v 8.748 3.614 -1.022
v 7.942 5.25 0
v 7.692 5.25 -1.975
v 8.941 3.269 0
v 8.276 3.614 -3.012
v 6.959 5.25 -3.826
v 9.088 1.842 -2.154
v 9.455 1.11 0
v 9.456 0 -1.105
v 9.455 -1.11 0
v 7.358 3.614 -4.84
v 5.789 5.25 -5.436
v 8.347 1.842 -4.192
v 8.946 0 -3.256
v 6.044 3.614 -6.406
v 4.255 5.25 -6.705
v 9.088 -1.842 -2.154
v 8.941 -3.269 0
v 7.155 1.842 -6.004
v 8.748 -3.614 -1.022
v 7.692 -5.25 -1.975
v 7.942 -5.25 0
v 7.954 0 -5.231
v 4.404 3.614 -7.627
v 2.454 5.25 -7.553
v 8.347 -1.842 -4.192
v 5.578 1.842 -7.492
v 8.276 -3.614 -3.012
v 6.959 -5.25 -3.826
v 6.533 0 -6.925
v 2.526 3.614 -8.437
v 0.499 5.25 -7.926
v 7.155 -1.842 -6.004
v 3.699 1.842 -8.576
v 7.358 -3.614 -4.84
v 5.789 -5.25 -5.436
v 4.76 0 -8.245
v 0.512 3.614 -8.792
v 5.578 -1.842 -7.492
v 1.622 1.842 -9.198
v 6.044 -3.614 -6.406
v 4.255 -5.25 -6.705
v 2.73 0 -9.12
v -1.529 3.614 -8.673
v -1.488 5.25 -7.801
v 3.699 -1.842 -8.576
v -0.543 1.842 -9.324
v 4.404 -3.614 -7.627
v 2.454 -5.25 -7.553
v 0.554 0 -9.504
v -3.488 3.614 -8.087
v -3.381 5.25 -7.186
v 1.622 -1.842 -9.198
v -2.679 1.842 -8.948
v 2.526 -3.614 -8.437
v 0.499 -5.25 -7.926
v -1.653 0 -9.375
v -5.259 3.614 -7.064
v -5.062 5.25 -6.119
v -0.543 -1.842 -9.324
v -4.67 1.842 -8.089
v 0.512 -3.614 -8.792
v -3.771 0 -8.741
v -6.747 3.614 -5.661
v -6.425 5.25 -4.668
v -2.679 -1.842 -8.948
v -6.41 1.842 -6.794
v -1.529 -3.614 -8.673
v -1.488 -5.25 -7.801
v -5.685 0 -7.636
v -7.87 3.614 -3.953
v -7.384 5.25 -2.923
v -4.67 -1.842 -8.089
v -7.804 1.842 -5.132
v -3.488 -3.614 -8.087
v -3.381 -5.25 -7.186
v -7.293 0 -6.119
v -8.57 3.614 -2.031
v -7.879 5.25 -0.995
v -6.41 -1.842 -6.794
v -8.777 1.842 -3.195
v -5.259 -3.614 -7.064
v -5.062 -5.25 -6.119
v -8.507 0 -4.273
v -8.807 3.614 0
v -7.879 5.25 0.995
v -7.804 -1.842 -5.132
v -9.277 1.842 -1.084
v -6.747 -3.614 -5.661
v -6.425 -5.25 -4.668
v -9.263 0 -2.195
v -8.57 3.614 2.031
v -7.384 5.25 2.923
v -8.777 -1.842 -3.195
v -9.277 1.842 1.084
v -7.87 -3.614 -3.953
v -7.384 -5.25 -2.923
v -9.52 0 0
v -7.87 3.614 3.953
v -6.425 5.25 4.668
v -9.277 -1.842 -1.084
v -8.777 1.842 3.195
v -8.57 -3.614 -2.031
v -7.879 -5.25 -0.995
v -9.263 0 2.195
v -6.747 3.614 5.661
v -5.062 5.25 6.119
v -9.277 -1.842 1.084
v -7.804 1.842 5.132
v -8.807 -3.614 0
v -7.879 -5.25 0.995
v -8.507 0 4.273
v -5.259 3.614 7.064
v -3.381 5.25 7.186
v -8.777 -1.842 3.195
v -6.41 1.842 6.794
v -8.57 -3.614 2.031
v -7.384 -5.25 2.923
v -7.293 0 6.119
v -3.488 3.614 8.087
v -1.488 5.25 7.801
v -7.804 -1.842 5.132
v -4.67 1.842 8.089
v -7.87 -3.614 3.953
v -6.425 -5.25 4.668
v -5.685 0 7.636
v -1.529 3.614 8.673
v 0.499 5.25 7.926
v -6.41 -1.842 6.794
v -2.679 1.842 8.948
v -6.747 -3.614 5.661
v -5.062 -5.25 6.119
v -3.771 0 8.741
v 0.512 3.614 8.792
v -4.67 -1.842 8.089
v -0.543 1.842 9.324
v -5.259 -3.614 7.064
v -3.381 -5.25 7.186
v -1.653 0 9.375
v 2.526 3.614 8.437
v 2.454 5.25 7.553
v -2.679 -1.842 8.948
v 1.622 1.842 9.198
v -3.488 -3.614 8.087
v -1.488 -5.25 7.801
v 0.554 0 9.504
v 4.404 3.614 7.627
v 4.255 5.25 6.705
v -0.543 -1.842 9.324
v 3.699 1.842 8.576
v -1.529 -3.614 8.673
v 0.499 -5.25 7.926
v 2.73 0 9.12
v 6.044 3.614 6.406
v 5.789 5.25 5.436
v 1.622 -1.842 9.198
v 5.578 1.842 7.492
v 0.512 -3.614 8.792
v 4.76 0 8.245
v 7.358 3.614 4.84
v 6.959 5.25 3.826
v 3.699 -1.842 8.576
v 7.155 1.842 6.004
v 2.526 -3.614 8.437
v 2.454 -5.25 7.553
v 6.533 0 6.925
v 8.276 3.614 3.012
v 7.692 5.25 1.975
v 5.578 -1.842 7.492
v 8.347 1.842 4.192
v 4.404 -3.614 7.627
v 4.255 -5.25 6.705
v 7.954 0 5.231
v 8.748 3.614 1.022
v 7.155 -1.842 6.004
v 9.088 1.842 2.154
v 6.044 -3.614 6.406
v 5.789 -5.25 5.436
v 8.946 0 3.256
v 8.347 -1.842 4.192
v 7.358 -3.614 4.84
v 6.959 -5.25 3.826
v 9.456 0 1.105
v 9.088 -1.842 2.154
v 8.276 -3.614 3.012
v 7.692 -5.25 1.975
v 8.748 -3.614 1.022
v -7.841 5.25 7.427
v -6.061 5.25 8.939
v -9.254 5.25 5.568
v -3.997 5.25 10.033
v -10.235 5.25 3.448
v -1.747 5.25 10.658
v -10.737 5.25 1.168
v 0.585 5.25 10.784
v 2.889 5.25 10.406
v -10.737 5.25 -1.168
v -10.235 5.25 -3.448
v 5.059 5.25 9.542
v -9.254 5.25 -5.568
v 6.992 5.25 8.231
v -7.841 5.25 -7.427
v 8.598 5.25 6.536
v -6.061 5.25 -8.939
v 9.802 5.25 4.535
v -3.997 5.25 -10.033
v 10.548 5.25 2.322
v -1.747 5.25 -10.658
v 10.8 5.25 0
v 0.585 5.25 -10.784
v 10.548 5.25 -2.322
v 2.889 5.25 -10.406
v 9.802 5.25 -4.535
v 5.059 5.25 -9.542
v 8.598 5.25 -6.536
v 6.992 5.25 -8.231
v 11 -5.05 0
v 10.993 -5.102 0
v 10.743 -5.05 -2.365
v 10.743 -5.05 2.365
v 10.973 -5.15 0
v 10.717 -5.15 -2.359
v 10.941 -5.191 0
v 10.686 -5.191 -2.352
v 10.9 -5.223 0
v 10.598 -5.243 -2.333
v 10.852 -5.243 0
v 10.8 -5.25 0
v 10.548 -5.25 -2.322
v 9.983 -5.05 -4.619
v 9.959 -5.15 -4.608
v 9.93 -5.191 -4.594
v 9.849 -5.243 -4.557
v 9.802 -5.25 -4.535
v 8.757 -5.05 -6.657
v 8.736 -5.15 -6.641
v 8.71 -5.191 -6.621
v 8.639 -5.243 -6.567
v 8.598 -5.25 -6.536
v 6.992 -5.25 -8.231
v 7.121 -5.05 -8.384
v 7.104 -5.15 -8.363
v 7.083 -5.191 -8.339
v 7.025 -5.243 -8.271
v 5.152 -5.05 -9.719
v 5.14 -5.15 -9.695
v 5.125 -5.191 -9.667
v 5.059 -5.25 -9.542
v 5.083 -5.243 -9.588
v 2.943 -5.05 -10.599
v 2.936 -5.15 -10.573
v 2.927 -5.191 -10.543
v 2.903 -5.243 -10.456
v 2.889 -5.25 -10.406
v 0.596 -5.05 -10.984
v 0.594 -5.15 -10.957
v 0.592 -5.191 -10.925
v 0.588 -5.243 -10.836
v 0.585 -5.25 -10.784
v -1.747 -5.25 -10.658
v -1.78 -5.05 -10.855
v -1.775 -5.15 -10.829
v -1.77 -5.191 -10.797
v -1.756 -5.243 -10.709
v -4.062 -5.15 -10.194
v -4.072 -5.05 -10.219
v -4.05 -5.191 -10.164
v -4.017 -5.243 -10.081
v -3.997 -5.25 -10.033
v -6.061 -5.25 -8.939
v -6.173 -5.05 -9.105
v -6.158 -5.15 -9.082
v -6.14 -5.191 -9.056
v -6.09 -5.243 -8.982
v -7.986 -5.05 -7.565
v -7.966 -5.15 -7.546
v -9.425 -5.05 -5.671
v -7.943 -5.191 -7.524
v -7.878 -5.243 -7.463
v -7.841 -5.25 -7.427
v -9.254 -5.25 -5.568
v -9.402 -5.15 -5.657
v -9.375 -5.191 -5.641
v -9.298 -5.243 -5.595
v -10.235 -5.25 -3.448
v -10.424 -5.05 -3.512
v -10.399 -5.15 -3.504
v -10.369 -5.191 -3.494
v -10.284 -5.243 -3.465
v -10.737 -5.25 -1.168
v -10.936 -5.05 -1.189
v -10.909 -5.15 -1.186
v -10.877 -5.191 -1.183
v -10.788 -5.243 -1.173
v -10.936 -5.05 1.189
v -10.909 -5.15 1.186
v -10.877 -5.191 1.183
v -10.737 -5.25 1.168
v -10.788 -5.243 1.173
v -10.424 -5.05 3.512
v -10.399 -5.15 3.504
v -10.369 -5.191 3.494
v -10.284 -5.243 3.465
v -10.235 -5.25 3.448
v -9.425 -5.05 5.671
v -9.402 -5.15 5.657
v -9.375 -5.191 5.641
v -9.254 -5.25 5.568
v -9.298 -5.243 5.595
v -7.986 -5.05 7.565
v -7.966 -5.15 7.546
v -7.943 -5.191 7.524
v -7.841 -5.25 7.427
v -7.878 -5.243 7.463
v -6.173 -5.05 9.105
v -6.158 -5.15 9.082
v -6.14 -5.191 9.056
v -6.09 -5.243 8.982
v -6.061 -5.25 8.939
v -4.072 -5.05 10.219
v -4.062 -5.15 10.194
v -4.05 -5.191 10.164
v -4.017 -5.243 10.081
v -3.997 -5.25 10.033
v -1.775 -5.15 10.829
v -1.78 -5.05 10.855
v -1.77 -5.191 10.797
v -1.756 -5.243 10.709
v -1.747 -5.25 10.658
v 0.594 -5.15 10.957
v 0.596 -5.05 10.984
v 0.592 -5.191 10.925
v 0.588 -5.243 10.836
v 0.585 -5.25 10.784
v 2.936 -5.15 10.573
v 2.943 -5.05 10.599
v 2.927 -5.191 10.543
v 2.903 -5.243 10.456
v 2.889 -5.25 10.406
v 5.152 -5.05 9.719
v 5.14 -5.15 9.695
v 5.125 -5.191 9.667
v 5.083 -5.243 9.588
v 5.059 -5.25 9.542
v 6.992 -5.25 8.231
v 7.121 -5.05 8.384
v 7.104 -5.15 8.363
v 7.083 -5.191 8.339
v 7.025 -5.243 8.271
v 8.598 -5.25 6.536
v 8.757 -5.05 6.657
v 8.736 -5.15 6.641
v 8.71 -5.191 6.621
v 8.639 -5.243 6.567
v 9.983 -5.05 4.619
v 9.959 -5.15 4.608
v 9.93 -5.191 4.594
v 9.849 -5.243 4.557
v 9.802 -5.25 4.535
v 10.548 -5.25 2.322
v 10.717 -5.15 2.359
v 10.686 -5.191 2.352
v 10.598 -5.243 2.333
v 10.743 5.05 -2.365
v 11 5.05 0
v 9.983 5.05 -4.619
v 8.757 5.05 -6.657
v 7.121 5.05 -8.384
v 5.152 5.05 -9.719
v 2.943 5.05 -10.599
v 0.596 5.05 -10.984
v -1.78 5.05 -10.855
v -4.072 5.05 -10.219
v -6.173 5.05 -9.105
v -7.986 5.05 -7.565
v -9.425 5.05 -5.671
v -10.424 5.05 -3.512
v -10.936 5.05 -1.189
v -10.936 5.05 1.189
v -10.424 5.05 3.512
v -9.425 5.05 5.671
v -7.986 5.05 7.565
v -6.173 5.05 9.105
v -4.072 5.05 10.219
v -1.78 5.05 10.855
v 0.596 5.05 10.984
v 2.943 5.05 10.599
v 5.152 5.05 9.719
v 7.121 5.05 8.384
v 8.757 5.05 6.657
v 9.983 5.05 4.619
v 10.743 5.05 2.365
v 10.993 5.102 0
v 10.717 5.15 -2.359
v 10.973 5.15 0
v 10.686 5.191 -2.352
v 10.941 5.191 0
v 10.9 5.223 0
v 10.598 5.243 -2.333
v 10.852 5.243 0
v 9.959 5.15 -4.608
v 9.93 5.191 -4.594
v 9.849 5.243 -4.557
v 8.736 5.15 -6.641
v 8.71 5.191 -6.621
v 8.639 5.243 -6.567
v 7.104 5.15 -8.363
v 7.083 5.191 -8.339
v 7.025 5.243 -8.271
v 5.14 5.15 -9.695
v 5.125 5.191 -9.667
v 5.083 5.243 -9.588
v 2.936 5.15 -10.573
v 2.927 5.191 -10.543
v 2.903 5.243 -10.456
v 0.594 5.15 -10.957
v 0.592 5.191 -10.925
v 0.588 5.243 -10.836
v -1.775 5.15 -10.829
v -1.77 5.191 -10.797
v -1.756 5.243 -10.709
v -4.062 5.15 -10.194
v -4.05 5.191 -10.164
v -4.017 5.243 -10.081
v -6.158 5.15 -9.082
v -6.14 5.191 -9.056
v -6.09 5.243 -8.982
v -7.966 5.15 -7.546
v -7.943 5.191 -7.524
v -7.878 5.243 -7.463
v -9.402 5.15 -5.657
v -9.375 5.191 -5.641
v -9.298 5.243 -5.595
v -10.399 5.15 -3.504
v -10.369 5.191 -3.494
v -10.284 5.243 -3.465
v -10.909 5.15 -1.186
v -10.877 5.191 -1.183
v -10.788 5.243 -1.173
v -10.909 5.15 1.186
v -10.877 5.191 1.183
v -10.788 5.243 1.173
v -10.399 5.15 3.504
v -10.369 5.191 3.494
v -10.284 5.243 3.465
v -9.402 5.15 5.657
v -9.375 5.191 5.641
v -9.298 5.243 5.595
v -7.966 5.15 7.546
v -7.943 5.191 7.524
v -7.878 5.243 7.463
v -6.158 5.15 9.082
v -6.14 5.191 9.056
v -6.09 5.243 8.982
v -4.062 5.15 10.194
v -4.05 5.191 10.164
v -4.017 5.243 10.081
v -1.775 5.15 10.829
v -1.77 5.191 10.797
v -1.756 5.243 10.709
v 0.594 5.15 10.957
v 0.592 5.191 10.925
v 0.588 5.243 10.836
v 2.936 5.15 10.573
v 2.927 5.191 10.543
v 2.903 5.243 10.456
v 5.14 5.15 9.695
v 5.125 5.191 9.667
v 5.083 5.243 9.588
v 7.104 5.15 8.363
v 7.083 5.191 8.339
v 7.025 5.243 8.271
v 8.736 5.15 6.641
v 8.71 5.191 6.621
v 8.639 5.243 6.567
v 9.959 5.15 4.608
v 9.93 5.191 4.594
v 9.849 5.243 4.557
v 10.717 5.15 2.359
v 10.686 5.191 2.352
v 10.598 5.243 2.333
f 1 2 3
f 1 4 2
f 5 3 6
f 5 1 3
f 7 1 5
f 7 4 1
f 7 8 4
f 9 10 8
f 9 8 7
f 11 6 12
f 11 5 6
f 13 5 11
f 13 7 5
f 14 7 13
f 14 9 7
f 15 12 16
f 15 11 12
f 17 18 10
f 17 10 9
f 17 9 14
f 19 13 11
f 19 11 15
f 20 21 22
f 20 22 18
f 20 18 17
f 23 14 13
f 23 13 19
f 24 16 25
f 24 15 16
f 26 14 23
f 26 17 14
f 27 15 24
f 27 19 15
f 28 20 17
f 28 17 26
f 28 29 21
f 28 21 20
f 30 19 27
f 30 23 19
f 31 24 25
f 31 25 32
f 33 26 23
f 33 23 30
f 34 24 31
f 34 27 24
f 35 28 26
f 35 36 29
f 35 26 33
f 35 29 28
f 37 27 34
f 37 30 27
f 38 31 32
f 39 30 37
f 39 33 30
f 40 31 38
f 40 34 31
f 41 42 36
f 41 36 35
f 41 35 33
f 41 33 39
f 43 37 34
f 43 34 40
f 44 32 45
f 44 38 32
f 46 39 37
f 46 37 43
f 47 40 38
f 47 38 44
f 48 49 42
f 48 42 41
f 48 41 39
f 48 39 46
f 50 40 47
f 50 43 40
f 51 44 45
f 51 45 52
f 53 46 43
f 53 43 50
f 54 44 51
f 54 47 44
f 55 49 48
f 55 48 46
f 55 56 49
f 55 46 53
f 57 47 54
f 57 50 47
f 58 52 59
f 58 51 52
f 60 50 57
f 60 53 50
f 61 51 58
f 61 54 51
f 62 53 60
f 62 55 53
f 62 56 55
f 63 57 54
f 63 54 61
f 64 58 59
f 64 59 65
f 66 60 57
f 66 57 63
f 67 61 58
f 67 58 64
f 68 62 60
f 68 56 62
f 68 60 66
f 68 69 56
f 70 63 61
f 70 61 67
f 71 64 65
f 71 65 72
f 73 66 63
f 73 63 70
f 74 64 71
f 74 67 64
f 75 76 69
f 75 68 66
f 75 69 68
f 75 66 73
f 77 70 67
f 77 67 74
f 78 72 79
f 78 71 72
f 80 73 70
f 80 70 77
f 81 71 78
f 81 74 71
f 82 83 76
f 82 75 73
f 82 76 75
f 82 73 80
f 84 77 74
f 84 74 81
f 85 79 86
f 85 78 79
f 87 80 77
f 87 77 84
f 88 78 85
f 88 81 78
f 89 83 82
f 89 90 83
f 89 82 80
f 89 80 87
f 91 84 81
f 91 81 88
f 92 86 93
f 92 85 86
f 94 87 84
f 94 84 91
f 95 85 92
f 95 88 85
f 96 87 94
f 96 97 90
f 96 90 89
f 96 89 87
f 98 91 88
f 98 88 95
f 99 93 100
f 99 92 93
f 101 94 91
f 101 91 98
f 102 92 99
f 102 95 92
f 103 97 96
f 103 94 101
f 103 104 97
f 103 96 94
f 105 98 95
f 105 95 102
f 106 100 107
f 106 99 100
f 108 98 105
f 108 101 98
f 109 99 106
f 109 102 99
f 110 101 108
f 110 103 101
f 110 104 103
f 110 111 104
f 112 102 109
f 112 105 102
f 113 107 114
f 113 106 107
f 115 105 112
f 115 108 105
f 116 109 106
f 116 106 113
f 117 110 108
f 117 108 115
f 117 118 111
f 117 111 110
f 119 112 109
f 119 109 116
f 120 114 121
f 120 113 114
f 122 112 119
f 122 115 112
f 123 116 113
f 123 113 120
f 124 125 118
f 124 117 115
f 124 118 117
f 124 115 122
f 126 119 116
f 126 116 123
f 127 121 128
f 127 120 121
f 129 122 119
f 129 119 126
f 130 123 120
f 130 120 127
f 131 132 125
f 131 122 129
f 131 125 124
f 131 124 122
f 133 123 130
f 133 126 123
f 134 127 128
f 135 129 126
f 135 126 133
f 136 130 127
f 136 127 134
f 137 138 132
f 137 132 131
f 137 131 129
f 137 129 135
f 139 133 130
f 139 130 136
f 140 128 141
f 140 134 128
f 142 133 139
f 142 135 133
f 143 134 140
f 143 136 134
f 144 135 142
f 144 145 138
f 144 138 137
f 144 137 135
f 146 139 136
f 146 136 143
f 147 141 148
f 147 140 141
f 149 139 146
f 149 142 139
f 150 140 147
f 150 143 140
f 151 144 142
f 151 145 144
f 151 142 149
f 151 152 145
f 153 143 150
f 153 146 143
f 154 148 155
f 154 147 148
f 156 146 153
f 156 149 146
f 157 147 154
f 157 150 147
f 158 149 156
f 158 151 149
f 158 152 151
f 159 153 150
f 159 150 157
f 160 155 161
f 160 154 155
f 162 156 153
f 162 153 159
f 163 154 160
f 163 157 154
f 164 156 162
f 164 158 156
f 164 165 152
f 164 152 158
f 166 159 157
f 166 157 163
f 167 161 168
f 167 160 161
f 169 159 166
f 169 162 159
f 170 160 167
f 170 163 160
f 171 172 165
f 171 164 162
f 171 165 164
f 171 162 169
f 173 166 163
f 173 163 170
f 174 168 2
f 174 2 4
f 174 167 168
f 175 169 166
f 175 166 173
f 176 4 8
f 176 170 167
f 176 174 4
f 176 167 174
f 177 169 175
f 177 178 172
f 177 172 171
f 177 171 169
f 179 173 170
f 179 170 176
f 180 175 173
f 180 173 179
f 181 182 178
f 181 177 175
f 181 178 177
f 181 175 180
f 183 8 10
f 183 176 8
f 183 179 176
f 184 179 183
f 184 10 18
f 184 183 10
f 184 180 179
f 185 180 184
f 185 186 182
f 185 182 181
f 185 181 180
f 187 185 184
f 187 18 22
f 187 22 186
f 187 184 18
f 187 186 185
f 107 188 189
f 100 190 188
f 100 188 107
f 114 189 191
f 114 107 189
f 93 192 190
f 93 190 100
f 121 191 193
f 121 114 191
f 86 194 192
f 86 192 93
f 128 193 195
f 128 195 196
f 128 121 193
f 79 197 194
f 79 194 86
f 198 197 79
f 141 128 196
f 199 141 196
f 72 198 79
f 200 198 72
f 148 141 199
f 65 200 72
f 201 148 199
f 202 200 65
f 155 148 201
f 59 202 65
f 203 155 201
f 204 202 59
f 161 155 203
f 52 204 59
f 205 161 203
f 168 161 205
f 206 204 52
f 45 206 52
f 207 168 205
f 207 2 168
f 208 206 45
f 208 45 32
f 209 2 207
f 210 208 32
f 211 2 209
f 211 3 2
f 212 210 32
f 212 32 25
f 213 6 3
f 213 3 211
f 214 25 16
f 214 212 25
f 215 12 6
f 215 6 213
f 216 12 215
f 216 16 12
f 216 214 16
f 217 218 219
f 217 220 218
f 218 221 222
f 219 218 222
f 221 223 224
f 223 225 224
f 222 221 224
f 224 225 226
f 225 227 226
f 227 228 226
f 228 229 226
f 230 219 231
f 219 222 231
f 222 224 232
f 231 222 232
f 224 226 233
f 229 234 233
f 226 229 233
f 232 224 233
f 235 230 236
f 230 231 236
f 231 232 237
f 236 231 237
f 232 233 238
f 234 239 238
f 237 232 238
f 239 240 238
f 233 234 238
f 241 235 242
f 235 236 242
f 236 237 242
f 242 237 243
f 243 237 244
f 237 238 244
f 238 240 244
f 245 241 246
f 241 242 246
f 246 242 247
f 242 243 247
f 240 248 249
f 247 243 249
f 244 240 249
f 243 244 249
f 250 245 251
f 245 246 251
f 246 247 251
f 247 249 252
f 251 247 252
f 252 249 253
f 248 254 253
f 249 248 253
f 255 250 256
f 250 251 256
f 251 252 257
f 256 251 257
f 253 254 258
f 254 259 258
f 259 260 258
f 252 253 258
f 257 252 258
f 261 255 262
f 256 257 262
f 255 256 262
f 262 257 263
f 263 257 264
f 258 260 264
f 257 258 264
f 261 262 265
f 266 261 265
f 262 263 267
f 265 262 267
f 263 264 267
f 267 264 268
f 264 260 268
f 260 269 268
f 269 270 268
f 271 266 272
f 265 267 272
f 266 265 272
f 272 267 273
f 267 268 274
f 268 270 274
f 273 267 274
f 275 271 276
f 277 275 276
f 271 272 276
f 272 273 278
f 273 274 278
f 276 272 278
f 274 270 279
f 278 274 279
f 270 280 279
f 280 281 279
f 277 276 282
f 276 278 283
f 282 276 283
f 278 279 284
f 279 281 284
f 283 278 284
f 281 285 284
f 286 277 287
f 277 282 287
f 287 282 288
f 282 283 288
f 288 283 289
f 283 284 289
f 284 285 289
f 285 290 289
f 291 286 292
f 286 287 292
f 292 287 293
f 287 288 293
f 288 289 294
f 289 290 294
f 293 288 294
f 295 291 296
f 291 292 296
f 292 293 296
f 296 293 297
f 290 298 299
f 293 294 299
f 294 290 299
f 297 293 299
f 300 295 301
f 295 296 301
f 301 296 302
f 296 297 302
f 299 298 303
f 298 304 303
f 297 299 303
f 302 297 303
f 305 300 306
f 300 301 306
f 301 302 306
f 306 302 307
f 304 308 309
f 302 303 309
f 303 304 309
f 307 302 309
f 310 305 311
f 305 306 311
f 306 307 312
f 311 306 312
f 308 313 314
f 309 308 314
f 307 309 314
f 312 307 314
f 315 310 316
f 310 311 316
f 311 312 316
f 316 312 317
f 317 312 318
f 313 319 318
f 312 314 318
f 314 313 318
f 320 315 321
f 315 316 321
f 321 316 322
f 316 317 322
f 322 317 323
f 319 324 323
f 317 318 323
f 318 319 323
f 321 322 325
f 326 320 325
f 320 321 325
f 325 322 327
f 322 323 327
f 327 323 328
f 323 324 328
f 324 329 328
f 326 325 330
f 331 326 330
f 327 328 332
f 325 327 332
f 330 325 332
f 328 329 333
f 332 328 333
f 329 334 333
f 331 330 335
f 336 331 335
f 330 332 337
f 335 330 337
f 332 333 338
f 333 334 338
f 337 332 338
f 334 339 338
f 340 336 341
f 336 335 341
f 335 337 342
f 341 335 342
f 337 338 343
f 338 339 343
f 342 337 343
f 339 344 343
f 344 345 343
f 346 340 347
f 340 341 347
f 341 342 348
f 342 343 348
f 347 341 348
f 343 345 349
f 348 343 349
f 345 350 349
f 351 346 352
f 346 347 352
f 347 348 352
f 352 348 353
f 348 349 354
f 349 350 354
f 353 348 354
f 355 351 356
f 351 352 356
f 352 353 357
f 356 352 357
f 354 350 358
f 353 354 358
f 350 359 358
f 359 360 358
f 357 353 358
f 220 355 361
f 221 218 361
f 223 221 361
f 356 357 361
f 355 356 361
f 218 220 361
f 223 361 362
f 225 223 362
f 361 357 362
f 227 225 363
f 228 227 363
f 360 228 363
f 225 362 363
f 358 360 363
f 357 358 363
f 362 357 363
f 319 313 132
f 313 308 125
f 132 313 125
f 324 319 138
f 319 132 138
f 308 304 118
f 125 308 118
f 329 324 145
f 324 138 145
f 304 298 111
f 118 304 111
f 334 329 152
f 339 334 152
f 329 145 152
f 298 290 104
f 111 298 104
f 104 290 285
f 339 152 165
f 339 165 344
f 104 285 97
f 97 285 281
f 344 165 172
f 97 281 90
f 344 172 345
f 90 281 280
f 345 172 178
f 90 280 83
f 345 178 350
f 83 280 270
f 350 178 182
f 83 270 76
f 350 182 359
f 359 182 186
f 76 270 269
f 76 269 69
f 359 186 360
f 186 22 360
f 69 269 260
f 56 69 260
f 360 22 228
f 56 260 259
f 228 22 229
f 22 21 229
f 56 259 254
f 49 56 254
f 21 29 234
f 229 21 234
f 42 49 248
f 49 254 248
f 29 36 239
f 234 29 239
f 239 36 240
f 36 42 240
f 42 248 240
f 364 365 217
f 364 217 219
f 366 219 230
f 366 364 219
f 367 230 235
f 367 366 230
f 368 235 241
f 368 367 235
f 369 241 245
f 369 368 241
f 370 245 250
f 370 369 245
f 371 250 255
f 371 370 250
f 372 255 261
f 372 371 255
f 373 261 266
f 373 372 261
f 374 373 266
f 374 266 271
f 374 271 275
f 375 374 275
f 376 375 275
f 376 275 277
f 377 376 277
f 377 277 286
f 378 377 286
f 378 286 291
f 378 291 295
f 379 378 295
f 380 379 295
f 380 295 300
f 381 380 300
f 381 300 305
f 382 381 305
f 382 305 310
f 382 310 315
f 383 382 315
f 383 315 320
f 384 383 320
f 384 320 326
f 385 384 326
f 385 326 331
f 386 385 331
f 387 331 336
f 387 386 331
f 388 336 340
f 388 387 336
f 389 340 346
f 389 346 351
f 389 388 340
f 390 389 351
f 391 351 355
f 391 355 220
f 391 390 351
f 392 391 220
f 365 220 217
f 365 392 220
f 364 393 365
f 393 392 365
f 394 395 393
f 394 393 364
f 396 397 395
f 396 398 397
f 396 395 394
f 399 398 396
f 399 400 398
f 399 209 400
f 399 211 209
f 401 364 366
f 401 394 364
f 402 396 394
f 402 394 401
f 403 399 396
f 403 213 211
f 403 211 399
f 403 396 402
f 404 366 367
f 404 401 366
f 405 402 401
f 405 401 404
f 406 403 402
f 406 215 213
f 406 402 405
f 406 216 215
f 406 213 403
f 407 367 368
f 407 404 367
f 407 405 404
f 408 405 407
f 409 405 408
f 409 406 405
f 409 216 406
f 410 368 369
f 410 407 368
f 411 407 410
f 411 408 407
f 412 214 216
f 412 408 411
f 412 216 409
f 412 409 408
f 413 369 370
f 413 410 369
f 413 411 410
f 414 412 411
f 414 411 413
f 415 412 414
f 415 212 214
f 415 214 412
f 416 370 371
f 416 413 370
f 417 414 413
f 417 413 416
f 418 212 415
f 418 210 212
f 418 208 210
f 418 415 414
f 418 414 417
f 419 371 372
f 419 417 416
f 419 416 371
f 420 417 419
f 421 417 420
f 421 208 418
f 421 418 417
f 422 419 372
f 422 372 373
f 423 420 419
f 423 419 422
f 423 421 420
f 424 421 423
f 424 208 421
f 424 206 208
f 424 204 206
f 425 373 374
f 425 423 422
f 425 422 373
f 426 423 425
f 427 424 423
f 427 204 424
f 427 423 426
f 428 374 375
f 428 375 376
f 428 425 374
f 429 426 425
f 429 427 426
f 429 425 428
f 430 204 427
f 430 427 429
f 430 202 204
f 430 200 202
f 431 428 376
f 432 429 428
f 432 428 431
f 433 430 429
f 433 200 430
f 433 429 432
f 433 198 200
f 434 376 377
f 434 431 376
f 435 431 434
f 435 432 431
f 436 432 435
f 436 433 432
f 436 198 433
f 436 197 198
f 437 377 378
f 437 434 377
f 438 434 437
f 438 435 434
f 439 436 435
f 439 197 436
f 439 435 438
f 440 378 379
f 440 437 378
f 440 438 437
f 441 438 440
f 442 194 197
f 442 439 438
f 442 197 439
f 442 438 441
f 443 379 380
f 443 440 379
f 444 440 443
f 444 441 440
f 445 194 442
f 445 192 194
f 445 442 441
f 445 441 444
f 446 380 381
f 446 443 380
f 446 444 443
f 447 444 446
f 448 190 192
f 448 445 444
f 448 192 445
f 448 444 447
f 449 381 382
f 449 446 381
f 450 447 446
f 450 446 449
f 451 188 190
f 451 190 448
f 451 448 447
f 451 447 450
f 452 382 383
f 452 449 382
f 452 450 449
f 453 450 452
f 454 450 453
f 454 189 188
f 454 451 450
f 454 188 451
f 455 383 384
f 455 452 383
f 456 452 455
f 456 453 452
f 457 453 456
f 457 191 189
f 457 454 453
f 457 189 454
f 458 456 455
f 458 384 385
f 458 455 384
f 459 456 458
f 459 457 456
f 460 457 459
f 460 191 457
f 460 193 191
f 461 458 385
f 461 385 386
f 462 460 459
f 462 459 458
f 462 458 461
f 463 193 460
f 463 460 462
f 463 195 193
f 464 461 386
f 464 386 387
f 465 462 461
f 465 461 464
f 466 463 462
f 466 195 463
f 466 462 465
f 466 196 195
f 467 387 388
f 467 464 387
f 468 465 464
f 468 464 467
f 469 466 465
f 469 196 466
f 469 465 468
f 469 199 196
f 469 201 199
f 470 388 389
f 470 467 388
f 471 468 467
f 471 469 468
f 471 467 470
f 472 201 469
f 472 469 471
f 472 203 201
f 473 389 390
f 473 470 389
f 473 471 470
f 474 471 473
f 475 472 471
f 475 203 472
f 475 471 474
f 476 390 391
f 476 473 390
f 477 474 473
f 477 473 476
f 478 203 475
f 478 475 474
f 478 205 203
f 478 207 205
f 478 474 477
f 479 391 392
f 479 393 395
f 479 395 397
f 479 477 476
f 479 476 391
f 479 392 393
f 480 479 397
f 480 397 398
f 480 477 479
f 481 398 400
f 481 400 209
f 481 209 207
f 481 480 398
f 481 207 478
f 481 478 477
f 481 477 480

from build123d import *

# Parameters (mm, degrees)
SZKIC1_R                    = 11
DODANIE_WYCI_GNI_CIE1_DEPTH = 5.25
ZAOKR_GLENIE1_R             = 0.2


with BuildPart() as part:
    # Szkic1 → Dodanie-wyciągnięcie1 (new body, symmetric)
    with BuildSketch(Plane(origin=(0, 0, 0), x_dir=(1, 0, 0), z_dir=(0, 1, 0))):
        Circle(SZKIC1_R)
    extrude(amount=DODANIE_WYCI_GNI_CIE1_DEPTH, both=True)

    # Szkic3 → Wycięcie-obrót1 (revolve, cut)
    with BuildSketch(Plane.XY):
        with BuildLine():
            Line((0, -9.52), (0, 9.52))
            ThreePointArc((0, 9.52), (9.52, 0), (0, -9.52))
        make_face()
    revolve(axis=Axis((0, -9.52, 0), (0, 1, 0)), mode=Mode.SUBTRACT)

    # Zaokrąglenie1
    zaokr_glenie1_edges = [part.edges().sort_by_distance(p)[0] for p in [
        (-11, -5.25, 0),
        (-11, 5.25, 0),
    ]]
    fillet(zaokr_glenie1_edges, radius=ZAOKR_GLENIE1_R)


solid = part.part
